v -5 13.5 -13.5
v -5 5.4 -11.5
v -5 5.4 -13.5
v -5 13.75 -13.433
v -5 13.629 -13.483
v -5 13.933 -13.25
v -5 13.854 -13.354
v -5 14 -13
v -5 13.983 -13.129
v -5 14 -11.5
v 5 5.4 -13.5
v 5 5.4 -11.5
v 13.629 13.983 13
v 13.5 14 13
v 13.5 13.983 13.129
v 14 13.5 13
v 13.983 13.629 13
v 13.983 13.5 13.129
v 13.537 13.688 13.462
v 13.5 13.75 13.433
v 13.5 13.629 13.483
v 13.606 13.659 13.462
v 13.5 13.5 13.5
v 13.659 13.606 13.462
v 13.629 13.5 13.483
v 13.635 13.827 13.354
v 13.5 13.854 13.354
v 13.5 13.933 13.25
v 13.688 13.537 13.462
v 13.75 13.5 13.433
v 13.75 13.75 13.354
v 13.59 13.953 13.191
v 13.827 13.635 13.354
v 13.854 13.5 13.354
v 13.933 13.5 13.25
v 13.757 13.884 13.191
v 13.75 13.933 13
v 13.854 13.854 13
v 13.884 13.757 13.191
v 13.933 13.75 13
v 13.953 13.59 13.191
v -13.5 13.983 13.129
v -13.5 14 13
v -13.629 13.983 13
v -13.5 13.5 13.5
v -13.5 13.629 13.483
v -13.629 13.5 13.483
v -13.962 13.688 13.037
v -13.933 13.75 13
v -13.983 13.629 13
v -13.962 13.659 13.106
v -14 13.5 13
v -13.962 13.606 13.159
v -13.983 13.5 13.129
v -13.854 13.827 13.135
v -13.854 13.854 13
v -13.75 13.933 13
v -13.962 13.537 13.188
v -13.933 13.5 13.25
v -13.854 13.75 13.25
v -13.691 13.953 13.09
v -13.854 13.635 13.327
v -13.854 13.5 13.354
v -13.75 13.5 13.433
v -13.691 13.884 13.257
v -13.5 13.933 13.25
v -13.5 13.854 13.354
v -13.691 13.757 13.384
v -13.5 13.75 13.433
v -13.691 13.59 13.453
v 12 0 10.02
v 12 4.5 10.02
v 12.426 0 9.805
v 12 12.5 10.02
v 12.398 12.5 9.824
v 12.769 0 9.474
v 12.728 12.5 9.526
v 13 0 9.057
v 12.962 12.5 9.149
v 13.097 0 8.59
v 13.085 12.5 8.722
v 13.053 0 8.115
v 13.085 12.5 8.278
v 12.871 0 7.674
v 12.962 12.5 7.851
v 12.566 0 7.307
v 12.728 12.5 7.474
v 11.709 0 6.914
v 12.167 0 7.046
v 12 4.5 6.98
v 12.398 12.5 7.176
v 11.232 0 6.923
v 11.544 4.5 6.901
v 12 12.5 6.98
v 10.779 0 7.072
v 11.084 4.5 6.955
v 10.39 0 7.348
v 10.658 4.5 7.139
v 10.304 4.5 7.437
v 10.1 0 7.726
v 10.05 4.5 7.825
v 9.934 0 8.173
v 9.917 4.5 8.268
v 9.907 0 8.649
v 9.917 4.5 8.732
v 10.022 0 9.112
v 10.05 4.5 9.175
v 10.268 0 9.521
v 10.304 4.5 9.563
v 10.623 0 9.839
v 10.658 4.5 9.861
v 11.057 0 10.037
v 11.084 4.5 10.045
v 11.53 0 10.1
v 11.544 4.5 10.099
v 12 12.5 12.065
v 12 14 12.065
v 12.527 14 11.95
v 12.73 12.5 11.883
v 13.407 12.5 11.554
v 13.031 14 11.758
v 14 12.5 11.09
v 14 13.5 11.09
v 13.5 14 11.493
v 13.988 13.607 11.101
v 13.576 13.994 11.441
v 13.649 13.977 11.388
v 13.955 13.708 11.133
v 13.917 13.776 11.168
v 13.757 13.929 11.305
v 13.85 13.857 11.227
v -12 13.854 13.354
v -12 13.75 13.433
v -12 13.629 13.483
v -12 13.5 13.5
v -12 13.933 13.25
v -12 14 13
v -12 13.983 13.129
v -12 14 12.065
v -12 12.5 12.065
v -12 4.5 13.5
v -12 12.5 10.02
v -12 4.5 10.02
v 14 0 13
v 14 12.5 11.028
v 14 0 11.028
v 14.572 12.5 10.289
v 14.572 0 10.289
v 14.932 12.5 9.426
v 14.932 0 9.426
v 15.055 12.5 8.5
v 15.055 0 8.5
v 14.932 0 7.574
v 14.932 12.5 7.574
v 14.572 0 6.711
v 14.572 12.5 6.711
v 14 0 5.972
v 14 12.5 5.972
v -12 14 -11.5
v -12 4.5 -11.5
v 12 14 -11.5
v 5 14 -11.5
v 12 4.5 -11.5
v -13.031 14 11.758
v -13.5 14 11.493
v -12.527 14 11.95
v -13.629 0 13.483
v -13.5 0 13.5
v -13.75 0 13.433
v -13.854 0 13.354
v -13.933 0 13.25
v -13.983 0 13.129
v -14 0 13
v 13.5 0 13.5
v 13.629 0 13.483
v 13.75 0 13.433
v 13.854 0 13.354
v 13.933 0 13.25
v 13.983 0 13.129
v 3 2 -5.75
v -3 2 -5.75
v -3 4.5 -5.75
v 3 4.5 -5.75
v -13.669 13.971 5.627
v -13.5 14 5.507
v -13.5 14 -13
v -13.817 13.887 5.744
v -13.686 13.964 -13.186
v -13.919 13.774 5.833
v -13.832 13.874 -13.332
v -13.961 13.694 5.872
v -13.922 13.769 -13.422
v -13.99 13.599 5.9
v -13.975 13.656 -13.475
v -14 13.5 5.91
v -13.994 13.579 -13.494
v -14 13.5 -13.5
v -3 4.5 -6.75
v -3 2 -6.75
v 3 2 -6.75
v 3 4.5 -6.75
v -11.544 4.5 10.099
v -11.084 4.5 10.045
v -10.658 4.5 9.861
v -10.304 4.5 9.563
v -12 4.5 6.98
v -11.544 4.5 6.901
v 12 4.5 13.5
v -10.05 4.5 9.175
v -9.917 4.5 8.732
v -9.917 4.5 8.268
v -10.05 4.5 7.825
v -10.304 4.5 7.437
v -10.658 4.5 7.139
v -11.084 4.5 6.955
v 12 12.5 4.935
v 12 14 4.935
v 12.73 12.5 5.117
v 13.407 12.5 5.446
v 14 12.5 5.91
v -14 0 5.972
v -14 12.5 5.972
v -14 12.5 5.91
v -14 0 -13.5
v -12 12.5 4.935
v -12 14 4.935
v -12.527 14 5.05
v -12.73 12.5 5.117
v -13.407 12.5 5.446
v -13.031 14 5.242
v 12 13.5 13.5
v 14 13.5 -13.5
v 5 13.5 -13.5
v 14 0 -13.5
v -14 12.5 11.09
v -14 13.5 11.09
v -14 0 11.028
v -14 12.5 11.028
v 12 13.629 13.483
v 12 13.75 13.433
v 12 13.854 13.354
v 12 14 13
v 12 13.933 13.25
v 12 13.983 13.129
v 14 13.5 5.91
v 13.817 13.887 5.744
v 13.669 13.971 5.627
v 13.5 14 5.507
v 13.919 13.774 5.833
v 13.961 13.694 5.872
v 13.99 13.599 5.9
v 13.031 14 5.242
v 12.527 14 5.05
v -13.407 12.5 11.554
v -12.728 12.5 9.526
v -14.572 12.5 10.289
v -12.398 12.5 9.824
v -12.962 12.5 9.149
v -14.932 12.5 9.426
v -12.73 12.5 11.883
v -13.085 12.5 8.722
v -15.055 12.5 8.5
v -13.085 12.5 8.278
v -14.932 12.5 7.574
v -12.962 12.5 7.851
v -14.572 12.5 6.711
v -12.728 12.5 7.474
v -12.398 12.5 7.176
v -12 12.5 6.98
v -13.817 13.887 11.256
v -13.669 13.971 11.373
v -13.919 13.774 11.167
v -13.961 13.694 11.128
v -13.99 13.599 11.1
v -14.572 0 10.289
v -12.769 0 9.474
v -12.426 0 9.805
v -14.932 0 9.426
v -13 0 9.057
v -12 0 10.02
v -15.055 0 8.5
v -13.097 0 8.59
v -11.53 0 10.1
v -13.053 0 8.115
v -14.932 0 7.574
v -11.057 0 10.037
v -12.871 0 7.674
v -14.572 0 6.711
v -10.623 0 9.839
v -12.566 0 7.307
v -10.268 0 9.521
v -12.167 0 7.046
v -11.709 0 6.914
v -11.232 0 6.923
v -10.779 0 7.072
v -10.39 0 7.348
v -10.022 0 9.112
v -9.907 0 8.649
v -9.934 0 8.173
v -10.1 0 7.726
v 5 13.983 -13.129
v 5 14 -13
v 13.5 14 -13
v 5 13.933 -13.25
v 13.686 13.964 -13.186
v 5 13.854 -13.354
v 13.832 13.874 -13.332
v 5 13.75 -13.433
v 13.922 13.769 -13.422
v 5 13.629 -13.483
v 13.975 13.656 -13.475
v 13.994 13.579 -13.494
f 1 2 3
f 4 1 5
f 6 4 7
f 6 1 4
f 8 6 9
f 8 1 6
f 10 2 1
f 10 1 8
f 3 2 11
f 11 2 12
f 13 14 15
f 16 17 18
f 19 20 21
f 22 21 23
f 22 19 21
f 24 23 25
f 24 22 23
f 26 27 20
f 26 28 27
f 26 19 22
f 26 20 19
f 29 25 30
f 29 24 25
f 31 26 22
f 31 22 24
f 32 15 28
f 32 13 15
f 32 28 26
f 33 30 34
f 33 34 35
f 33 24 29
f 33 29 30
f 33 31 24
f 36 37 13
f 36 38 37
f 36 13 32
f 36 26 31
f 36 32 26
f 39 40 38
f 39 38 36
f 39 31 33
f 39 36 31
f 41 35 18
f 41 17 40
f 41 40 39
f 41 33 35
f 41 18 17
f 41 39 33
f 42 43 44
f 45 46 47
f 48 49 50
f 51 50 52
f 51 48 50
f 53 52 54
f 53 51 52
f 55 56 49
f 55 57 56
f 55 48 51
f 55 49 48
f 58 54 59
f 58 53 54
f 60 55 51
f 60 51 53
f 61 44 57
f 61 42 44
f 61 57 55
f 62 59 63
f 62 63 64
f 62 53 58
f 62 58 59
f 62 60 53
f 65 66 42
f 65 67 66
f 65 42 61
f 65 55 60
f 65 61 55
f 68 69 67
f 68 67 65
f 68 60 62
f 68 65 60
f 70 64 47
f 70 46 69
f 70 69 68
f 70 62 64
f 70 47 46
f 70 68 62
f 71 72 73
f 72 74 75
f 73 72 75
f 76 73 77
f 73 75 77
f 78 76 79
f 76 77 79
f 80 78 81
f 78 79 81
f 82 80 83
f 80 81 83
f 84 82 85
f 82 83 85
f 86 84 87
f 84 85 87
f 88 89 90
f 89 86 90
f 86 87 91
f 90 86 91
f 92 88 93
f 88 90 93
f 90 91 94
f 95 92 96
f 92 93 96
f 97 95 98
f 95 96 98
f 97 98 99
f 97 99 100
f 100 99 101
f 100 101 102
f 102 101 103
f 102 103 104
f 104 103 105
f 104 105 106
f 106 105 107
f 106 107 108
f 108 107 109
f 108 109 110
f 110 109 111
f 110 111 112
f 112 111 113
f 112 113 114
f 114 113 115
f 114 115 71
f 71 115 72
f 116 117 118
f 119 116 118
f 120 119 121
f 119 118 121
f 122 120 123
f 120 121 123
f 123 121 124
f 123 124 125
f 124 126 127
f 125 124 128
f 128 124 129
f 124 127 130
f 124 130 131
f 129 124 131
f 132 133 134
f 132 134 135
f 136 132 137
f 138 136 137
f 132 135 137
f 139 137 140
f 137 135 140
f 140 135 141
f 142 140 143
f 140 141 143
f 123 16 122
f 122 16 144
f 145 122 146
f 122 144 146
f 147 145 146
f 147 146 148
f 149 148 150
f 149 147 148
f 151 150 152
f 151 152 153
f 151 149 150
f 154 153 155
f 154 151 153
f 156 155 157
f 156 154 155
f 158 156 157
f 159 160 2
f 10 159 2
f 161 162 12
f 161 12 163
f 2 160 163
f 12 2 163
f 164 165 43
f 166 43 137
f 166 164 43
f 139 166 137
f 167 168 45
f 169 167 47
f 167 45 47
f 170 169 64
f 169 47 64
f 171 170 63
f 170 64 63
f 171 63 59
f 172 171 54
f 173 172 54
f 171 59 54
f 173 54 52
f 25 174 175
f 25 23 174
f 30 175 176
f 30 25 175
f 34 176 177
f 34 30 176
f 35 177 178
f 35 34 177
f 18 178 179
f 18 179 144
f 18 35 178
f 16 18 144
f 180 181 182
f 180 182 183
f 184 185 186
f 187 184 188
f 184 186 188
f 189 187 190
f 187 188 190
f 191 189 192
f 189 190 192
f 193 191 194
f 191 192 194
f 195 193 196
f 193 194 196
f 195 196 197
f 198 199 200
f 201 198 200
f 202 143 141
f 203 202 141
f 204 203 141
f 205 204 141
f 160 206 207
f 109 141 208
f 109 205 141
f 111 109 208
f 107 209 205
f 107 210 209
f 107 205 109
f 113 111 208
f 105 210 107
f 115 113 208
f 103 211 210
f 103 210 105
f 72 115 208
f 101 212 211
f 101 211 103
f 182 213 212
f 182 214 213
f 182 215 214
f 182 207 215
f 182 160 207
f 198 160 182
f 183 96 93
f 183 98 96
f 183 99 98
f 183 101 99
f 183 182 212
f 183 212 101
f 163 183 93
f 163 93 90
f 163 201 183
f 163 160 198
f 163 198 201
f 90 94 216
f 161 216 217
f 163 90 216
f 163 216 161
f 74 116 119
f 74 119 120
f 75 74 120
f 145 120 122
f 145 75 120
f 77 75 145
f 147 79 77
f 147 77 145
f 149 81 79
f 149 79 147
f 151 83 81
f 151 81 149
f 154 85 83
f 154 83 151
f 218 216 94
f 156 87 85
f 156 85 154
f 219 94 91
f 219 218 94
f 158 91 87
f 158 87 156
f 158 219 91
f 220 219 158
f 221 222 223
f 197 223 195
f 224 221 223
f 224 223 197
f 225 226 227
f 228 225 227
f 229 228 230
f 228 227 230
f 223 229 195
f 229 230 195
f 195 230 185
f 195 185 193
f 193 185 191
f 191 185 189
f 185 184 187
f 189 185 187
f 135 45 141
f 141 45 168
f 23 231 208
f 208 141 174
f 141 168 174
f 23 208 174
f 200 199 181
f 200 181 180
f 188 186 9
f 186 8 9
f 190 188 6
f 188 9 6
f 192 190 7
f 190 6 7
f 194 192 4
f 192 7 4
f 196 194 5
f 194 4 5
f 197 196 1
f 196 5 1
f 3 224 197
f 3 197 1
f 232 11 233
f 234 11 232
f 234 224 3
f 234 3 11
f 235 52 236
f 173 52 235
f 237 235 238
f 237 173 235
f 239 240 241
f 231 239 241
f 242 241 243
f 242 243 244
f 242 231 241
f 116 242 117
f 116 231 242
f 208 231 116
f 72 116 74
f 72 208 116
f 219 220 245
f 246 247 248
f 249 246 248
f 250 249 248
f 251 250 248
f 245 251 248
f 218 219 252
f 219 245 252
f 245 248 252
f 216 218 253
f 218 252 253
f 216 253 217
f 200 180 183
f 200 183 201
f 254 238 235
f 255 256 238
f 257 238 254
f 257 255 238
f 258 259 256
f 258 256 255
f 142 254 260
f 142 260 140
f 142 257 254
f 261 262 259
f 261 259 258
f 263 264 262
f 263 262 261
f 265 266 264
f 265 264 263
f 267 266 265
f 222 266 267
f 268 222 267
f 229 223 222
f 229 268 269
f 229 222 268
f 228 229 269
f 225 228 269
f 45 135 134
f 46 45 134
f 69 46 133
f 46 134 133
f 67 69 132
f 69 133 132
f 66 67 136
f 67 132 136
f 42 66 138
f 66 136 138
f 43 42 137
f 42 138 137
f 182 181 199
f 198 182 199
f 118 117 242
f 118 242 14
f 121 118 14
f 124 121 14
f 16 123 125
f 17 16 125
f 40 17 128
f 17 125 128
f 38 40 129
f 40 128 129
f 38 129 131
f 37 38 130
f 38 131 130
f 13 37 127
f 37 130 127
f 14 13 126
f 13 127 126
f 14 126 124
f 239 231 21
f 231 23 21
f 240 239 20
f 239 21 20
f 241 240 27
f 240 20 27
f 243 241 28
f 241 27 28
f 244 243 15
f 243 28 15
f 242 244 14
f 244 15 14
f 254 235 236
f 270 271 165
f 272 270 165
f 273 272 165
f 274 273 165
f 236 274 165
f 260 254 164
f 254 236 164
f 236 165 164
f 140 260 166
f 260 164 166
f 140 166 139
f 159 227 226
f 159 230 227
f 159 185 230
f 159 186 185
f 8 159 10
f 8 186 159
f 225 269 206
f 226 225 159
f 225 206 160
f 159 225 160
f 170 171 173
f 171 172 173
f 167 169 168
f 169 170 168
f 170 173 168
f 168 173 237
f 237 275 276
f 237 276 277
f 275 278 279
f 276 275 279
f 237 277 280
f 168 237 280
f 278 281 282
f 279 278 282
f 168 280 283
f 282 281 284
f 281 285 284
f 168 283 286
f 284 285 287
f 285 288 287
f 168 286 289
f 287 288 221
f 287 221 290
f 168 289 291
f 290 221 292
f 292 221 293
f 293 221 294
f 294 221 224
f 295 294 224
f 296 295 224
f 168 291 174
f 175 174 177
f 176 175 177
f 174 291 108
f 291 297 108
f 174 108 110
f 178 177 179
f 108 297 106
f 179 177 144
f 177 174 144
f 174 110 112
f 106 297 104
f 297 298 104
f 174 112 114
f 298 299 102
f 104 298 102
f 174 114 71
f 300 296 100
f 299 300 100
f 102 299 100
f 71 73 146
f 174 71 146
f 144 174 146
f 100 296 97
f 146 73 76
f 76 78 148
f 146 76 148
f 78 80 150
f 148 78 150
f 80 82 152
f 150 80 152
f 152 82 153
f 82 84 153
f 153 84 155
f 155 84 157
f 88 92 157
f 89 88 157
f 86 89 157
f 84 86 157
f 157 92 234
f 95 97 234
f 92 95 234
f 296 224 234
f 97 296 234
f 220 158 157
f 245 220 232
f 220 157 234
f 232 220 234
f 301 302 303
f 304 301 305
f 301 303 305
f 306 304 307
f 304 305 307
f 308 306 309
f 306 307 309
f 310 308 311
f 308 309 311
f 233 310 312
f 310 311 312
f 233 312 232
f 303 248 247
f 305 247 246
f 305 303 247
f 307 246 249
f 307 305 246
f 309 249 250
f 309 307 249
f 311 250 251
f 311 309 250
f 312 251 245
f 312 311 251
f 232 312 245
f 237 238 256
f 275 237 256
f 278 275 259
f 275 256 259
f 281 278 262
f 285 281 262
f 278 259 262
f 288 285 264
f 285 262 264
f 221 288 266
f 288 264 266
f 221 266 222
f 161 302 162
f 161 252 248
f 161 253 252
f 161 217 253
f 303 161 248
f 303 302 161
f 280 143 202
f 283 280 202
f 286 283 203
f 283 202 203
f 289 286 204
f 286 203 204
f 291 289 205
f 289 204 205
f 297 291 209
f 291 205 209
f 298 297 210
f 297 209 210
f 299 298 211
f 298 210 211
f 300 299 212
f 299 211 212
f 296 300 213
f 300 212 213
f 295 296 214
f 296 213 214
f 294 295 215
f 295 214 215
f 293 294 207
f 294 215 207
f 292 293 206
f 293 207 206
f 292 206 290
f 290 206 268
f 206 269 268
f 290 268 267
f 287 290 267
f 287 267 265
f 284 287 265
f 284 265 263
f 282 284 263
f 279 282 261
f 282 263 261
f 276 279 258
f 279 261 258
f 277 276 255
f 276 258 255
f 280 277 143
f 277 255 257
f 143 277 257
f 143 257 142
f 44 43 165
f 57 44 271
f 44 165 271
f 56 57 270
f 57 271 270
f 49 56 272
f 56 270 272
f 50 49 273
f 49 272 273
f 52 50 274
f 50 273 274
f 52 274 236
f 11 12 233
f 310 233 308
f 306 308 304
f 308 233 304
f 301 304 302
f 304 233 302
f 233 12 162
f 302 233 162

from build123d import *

# Parameters (mm, degrees)
SKETCH1_W           = 28
SKETCH1_H           = 27
BOSS_EXTRUDE1_DEPTH = 14
SHELL1_T            = -2
SKETCH2_W           = 24
SKETCH2_H           = 23
SKETCH2_W_2         = 6
SKETCH2_H_2         = 1
BOSS_EXTRUDE2_DEPTH = 2.5
CUT_EXTRUDE1_REACH  = 35.481
SKETCH3_W           = 24
SKETCH3_H           = 9.5
CUT_EXTRUDE2_REACH  = 25.964
SKETCH4_R           = 1.6
BOSS_EXTRUDE3_DEPTH = 14
CUT_EXTRUDE4_REACH  = 34.368
SKETCH7_W           = 10
SKETCH7_H           = 8.6
SKETCH8_R           = 3.6
CUT_EXTRUDE5_DEPTH  = 1.5
FILLET1_R           = 0.5


with BuildPart() as part:
    # Sketch1 → Boss-Extrude1 (new body)
    with BuildSketch(Plane(origin=(0, 0, 0), x_dir=(1, 0, 0), z_dir=(0, 1, 0))):
        Rectangle(SKETCH1_W, SKETCH1_H)
    extrude(amount=BOSS_EXTRUDE1_DEPTH)

    # Shell1
    shell1_openings = [part.faces().sort_by_distance(p)[0] for p in [
        (0, 14, 0),
    ]]
    offset(amount=SHELL1_T, openings=shell1_openings, kind=Kind.INTERSECTION)

    # Sketch2 → Boss-Extrude2 (add)
    with BuildSketch(Plane(origin=(0, 2, 0), x_dir=(1, 0, 0), z_dir=(0, 1, 0))):
        Rectangle(SKETCH2_W, SKETCH2_H)
        with Locations((0, 6.25)):
            Rectangle(SKETCH2_W_2, SKETCH2_H_2, mode=Mode.SUBTRACT)
    extrude(amount=BOSS_EXTRUDE2_DEPTH)

    # Sketch3 → Cut-Extrude1 (cut, up to next)
    with BuildSketch(Plane.XY.offset(13.5), mode=Mode.PRIVATE) as cut_extrude1_sk1:
        with Locations((0, 9.25)):
            Rectangle(SKETCH3_W, SKETCH3_H)
    cut_extrude1_tool1 = extrude(cut_extrude1_sk1.sketch, amount=-CUT_EXTRUDE1_REACH, mode=Mode.PRIVATE) & part.part
    add(cut_extrude1_tool1.solids().sort_by_distance((0, 9.25, 13.5))[0], mode=Mode.SUBTRACT)

    # Sketch4 → Cut-Extrude2 (cut, up to next)
    with BuildSketch(Plane(origin=(0, 14, 0), x_dir=(1, 0, 0), z_dir=(0, 1, 0)), mode=Mode.PRIVATE) as cut_extrude2_sk1:
        with Locations(Location((-11.5, -8.5, 0), (0, 0, 251.790043136))):
            Circle(SKETCH4_R)
    cut_extrude2_tool1 = extrude(cut_extrude2_sk1.sketch, amount=-CUT_EXTRUDE2_REACH, mode=Mode.PRIVATE) & part.part
    # Sketch4 → Cut-Extrude2 (cut, up to next)
    with BuildSketch(Plane(origin=(0, 14, 0), x_dir=(1, 0, 0), z_dir=(0, 1, 0)), mode=Mode.PRIVATE) as cut_extrude2_sk2:
        with Locations(Location((11.5, -8.5, 0), (0, 0, 288.209956864))):
            Circle(SKETCH4_R)
    cut_extrude2_tool2 = extrude(cut_extrude2_sk2.sketch, amount=-CUT_EXTRUDE2_REACH, mode=Mode.PRIVATE) & part.part
    add(cut_extrude2_tool1.solids().sort_by_distance((-11.5, 14, 8.5))[0], mode=Mode.SUBTRACT)
    add(cut_extrude2_tool2.solids().sort_by_distance((11.5, 14, 8.5))[0], mode=Mode.SUBTRACT)

    # Sketch5 → Boss-Extrude3 (add)
    with BuildSketch(Plane(origin=(0, 14, 0), x_dir=(1, 0, 0), z_dir=(0, 1, 0))):
        with BuildLine():
            Line((12, -4.980131585), (12, -6.980131585))
            ThreePointArc((12, -6.980131585), (13.1, -8.5), (12, -10.019868415))
            Line((12, -10.019868415), (12, -12.019868415))
            ThreePointArc((12, -12.019868415), (15.055203744, -8.5), (12, -4.980131585))
        make_face()
        with BuildLine():
            Line((-12, -4.980131585), (-12, -6.980131585))
            ThreePointArc((-12, -6.980131585), (-13.1, -8.5), (-12, -10.019868415))
            Line((-12, -10.019868415), (-12, -12.019868415))
            ThreePointArc((-12, -12.019868415), (-15.055203744, -8.5), (-12, -4.980131585))
        make_face()
    extrude(amount=-BOSS_EXTRUDE3_DEPTH)

    # Sketch7 → Cut-Extrude4 (cut, up to next)
    with BuildSketch(Plane.XY.offset(-11.5), mode=Mode.PRIVATE) as cut_extrude4_sk1:
        with Locations((0, 9.7)):
            Rectangle(SKETCH7_W, SKETCH7_H)
    cut_extrude4_tool1 = extrude(cut_extrude4_sk1.sketch, amount=-CUT_EXTRUDE4_REACH, mode=Mode.PRIVATE) & part.part
    add(cut_extrude4_tool1.solids().sort_by_distance((0, 9.7, -11.5))[0], mode=Mode.SUBTRACT)

    # Sketch8 → Cut-Extrude5 (cut)
    with BuildSketch(Plane(origin=(0, 14, 0), x_dir=(1, 0, 0), z_dir=(0, 1, 0))):
        with Locations((11.5, -8.5)):
            Circle(SKETCH8_R)
        with Locations((-11.5, -8.5)):
            Circle(SKETCH8_R)
    extrude(amount=-CUT_EXTRUDE5_DEPTH, mode=Mode.SUBTRACT)

    # Fillet1
    fillet1_edges = [part.edges().sort_by_distance(p)[0] for p in [
        (14, 14, 12.295183385),
        (9.5, 14, -13.5),
        (-13, 14, 13.5),
        (-14, 14, -3.795183385),
        (14, 14, -3.795183385),
        (-14, 14, 12.295183385),
        (13, 14, 13.5),
        (-14, 7, 13.5),
        (14, 7, 13.5),
        (-9.5, 14, -13.5),
    ]]
    fillet(fillet1_edges, radius=FILLET1_R)


solid = part.part
